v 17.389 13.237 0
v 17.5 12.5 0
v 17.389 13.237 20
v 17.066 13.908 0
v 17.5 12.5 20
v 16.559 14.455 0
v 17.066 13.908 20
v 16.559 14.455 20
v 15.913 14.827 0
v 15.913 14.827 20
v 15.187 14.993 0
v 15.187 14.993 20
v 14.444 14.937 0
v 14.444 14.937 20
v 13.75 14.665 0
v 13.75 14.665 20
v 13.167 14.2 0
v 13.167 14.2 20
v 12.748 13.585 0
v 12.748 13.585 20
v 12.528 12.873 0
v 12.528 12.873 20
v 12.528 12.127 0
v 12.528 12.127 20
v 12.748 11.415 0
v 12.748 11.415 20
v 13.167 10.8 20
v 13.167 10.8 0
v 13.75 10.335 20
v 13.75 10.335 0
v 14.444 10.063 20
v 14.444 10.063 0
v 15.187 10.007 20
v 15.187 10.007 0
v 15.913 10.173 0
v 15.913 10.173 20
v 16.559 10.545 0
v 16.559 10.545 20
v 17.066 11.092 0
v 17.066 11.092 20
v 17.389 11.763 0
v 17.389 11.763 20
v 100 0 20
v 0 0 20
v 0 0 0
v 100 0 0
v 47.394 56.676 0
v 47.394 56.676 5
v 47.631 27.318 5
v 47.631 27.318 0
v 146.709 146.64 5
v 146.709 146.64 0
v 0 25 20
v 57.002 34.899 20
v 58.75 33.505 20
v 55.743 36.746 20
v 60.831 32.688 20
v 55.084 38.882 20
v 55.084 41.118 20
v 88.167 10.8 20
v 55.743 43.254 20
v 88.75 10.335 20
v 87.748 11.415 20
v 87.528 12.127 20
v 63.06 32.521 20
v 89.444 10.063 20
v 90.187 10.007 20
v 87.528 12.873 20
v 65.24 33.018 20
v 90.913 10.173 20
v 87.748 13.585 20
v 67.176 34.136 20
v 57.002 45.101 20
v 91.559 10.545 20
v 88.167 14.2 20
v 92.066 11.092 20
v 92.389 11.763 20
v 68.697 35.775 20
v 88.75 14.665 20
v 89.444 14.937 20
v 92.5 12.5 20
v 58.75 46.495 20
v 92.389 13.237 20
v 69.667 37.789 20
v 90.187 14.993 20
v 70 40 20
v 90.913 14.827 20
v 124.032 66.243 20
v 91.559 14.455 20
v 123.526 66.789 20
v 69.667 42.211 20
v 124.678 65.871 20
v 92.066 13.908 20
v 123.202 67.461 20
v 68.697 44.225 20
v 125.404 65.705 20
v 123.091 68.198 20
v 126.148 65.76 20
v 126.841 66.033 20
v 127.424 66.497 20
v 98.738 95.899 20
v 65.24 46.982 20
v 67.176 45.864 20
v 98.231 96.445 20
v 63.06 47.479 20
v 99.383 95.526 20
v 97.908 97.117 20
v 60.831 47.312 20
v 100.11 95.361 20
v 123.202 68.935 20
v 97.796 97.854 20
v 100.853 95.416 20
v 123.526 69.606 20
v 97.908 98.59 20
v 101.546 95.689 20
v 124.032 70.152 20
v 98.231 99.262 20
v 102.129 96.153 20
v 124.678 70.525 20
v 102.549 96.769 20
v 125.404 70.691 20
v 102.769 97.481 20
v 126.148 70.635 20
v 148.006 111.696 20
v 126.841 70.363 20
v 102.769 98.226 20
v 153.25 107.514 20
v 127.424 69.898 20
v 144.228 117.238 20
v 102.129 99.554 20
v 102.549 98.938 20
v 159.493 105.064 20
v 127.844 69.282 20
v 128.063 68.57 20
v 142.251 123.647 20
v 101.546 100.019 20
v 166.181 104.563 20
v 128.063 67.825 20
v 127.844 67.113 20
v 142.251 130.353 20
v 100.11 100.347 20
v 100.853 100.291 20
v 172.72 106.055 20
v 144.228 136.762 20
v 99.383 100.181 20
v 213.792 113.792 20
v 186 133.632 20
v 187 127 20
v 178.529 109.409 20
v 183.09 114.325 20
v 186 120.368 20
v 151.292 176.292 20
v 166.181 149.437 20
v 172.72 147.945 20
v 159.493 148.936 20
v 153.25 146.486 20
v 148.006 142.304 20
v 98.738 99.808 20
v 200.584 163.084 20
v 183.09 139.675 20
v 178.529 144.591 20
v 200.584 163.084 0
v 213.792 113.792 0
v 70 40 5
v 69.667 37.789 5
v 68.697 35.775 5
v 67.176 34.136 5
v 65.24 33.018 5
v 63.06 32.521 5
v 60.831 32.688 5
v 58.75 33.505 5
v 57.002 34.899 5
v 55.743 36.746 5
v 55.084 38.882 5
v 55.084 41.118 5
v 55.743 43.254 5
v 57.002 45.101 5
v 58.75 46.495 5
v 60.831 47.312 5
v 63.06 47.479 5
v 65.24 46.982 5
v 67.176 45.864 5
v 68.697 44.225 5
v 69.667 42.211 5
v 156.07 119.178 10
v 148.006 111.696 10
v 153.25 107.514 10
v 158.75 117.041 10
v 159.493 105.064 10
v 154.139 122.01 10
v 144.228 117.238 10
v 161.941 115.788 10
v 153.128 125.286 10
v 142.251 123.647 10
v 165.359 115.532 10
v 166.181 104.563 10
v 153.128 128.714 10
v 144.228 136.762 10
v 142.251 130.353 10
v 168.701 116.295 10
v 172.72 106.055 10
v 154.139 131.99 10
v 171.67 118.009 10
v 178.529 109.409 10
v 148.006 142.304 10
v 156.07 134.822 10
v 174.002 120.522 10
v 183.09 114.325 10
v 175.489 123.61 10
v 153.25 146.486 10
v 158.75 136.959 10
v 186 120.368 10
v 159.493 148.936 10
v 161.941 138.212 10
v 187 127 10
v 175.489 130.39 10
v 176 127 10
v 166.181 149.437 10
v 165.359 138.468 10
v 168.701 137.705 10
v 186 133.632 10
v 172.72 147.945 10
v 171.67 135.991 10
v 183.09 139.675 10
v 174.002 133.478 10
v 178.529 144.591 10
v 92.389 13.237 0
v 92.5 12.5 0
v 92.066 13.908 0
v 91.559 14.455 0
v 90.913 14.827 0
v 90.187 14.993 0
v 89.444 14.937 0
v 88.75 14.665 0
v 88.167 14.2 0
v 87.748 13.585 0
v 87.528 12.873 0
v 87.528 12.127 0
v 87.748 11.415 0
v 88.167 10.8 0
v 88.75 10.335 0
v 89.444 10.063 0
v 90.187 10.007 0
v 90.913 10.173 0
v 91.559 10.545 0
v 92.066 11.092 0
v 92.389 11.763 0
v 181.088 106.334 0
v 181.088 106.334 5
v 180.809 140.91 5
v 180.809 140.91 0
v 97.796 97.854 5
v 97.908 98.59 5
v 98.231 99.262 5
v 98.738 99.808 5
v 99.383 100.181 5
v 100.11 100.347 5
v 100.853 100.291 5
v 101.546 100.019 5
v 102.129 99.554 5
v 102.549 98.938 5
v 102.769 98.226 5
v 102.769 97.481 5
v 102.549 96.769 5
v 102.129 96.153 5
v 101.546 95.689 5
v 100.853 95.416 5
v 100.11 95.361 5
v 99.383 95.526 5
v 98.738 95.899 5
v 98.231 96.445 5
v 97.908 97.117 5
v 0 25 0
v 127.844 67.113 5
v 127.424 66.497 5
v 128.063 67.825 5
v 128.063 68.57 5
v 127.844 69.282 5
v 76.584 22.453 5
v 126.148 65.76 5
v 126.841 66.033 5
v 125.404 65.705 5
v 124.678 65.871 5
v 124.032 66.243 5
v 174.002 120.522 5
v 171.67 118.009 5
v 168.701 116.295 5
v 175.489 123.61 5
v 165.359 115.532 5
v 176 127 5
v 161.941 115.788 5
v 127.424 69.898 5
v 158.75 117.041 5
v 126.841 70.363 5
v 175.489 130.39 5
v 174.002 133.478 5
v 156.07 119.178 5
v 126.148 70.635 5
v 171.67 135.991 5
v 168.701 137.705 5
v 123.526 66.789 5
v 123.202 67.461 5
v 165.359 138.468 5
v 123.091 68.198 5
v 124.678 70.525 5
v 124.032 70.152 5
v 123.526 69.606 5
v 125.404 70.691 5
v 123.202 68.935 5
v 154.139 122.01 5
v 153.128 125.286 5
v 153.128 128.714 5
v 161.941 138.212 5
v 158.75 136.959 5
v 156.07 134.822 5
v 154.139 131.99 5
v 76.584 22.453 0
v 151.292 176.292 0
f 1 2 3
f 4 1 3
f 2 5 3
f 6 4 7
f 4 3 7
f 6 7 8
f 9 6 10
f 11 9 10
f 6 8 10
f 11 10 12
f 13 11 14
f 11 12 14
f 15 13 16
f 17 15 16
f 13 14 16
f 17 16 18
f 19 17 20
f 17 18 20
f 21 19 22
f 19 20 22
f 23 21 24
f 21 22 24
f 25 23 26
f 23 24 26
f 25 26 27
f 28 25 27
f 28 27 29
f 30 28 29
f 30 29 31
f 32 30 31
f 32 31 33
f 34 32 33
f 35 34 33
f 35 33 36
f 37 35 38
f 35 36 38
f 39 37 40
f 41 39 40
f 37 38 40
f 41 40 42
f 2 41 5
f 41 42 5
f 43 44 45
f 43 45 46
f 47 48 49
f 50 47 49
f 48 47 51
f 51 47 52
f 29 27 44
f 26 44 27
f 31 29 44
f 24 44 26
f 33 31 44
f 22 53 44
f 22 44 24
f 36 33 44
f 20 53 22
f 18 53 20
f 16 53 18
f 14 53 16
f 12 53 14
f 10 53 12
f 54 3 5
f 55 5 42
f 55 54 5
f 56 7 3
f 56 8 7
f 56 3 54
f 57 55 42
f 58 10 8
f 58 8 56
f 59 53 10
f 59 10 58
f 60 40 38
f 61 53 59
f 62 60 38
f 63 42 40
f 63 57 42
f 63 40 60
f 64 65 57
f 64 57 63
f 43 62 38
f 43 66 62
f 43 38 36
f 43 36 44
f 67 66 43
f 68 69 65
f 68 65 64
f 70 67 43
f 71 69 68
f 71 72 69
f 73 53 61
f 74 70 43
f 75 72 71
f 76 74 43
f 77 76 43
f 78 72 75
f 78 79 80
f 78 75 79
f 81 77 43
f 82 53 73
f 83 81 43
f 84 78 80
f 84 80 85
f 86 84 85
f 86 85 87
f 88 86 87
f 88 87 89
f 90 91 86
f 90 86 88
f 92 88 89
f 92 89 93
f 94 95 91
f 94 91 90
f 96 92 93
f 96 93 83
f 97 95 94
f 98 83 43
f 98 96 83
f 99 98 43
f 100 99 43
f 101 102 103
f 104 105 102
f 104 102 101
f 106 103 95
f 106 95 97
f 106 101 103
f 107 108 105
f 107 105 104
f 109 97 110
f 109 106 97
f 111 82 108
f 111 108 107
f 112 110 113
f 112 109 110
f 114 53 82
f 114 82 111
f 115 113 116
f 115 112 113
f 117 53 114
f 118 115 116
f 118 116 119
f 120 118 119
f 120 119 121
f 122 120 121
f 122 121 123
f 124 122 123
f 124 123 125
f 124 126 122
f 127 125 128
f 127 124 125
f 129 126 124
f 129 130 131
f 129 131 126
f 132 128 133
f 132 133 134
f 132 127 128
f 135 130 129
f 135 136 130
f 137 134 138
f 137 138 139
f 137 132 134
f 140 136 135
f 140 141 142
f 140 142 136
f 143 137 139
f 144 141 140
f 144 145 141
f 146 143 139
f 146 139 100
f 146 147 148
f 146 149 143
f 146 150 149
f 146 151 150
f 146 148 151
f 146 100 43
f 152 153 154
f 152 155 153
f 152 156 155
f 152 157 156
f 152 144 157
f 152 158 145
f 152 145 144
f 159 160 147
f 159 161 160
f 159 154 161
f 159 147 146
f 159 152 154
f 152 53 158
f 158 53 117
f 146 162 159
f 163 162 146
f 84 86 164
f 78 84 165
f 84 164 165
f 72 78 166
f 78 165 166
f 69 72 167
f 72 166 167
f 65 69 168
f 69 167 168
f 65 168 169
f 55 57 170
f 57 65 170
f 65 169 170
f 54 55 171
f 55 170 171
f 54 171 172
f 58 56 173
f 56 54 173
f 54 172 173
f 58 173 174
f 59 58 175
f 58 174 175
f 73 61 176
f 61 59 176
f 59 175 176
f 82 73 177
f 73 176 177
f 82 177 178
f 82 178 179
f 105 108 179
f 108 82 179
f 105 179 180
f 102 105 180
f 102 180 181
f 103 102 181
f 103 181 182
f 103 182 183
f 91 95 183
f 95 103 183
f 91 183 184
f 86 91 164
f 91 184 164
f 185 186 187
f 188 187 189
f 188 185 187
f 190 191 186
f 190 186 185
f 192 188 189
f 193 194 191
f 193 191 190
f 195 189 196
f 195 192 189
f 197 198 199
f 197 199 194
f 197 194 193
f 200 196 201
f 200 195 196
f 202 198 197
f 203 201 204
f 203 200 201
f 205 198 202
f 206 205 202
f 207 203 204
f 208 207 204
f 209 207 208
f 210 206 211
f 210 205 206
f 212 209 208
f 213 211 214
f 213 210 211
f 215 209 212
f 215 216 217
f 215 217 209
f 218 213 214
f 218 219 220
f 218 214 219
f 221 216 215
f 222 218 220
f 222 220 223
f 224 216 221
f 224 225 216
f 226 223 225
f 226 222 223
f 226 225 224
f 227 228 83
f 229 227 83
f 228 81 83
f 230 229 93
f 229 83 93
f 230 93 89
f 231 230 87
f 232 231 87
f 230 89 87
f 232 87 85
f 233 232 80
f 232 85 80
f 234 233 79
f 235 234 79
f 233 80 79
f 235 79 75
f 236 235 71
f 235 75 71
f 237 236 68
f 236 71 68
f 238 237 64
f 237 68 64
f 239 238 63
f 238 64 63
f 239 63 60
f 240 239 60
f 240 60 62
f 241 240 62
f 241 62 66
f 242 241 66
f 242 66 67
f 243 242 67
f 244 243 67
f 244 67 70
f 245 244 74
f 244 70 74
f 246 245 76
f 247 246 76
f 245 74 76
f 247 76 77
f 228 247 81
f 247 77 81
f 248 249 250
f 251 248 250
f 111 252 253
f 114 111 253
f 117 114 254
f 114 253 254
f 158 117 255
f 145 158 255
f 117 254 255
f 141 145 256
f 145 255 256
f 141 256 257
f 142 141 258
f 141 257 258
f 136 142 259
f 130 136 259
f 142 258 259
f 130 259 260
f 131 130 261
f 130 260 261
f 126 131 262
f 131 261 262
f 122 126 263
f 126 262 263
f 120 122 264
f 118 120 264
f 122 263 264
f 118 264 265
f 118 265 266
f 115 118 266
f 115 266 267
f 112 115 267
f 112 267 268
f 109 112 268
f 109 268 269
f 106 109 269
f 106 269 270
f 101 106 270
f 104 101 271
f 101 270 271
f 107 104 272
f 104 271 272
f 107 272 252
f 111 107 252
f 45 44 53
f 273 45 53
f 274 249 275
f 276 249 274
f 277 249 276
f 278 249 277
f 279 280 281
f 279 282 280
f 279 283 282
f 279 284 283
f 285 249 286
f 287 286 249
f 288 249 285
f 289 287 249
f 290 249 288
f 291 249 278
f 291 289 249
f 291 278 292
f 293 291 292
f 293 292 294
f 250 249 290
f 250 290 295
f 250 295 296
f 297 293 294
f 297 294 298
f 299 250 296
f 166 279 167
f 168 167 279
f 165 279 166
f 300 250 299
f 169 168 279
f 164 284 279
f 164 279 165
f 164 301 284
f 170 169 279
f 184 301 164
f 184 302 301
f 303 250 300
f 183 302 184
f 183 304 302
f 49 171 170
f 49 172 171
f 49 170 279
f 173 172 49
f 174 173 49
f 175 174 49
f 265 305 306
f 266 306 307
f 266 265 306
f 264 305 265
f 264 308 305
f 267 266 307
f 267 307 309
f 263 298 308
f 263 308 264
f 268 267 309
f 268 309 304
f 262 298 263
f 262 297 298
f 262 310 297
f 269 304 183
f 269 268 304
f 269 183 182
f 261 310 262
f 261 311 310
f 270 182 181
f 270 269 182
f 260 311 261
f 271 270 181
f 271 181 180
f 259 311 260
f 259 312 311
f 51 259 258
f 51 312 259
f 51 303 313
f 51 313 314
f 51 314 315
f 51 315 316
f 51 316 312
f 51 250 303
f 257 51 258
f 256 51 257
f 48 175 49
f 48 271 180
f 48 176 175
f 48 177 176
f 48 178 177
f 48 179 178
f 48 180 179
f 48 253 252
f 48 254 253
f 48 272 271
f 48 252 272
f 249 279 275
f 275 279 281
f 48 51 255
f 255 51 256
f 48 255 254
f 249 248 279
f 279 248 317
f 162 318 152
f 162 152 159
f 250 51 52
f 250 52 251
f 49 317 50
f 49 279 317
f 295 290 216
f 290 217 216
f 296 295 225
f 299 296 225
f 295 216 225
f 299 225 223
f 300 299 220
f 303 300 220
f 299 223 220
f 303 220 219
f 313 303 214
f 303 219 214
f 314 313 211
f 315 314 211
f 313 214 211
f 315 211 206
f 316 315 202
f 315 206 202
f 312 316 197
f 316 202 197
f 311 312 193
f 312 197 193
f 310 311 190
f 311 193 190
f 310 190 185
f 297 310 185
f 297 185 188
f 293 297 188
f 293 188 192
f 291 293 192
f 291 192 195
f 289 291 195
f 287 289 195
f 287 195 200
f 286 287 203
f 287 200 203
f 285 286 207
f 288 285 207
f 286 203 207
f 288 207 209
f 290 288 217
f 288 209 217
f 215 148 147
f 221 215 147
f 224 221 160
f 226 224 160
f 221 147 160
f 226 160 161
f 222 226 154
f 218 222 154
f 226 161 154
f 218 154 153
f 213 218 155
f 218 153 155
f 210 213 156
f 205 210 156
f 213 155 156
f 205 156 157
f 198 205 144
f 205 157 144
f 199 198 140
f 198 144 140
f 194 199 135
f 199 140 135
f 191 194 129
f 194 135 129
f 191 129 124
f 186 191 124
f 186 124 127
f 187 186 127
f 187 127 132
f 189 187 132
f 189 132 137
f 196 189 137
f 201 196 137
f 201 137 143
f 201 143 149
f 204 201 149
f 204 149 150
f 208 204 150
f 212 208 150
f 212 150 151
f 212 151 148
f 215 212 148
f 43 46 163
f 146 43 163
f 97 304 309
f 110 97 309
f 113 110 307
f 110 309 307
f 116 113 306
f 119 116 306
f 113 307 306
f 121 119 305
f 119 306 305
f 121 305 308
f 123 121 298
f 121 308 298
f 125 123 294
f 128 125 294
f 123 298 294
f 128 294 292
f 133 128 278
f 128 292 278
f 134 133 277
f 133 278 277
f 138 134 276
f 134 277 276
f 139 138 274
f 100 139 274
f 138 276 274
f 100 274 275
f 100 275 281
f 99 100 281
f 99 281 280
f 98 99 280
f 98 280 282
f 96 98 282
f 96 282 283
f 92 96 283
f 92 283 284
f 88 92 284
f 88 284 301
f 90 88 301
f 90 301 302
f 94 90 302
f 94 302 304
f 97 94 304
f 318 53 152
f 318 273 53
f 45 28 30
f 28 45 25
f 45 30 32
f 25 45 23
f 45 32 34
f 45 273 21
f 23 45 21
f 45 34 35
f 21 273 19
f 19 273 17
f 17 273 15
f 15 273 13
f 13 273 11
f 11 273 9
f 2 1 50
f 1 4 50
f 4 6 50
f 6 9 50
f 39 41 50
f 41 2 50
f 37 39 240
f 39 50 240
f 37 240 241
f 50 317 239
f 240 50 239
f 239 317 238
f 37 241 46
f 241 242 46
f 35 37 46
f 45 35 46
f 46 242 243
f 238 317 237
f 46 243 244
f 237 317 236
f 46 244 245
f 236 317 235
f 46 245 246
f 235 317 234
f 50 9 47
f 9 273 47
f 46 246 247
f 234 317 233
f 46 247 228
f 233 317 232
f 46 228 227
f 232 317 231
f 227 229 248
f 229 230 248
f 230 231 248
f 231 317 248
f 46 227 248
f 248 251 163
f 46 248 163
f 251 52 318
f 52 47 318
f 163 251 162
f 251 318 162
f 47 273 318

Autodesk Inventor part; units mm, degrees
ref_plane "XZ Plane" through (0, 0, 0) normal (0, 1, 0) x (-1, 0, 0)
ref_plane "XY Plane" through (0, 0, 0) normal (0, 0, 1) x (1, 0, 0)
sketch "Sketch1" plane through (0, 0, 0) normal (0, 0, 1) x (1, 0, 0)
  line L0 (0, 0) -> (100, 0)
  line L1 (100, 0) -> (100, 25)
  line L2 (100, 25) -> (0, 25)
  line L3 (0, 25) -> (0, 0)
  line L4 (0, 25) -> (115.2078, 140.2078)
  line L5 (100, 0) -> (177.7078, 77.7078)
  line L6 (151.2922, 176.2922) -> (200.5844, 163.0844)
  line L7 (200.5844, 163.0844) -> (213.7922, 113.7922)
  line L8 (213.7922, 113.7922) -> (177.7078, 77.7078)
  line L9 (177.7078, 77.7078) -> (128.4156, 90.9156)
  line L10 (128.4156, 90.9156) -> (115.2078, 140.2078)
  line L11 (115.2078, 140.2078) -> (151.2922, 176.2922)
  circle A0 centre (164.5, 127) radius 4
  dimension "d0" = 100
  dimension "d1" = 25
  dimension "d6" = 8
  dimension "d8" = 45
  dimension "d15" = 127
extrude "Extrusion1" add sketch "Sketch1" along normal blind 20
sketch "Sketch2" plane through (0, 0, 20) normal (0, 0, 1) x (1, 0, 0)
  line L0 (0, 25) -> (0, 0) projected
  line L1 (0, 0) -> (100, 0) projected
  line L2 (0, 25) -> (100, 25)
  line L3 (100, 25) -> (100, 0)
  line L4 (100, 0) -> (0, 0)
  line L5 (0, 0) -> (0, 25)
  line L6 (100, 25) -> (125, 25)
  line L7 (100, 0) -> (213.7922, 113.7922) projected
  line L8 (100, 0) -> (125, 25)
extrude "Extrusion2" add sketch "Sketch2" along normal blind 250
sketch "Sketch4" plane through (0, 0, 270) normal (0, 0, 1) x (1, 0, 0)
  line L0 (0, 25) -> (125, 25) projected
  line L1 (125, 25) -> (213.7922, 113.7922) projected
  line L2 (213.7922, 113.7922) -> (200.5844, 163.0844) projected
  line L3 (200.5844, 163.0844) -> (151.2922, 176.2922) projected
  line L4 (151.2922, 176.2922) -> (0, 25) projected
  circle A0 centre (164.5, 127) radius 4 projected
  line L5 (100, 0) -> (125, 25) projected
  line L6 (125, 25) -> (0, 25) projected
  line L7 (0, 25) -> (0, 0) projected
  line L8 (0, 0) -> (100, 0) projected
extrude "Extrusion3" add sketch "Sketch4" along normal blind 20
sketch "Sketch5" plane through (0, 0, 0) normal (0, -1, 0) x (1, 0, 0)
  line L0 (0, 0) -> (100, 0) projected
  line L1 (100, 0) -> (100, 290) projected
  line L2 (0, 290) -> (100, 290) projected
  line L3 (0, 0) -> (0, 290) projected
  line L4 (0, 0) -> (-125.5737, 72.5)
  line L5 (-125.5737, 72.5) -> (-125.5737, 217.5)
  line L6 (-125.5737, 217.5) -> (0, 290)
  line L7 (0, 290) -> (125.5737, 217.5)
  line L8 (125.5737, 217.5) -> (125.5737, 72.5)
  line L9 (125.5737, 72.5) -> (0, 0)
  point P0 (0, 145)
extrude "Extrusion4" add sketch "Sketch5" against normal blind 25 contours L4 L5 L6 L3
sketch "Sketch6" plane through (0, 25, 20) normal (0, 1, 0) x (1, 0, 0)
  line L0 (100, 20) -> (100, -270) projected
  circle A0 centre (-24.528, -125) radius 3
  circle A1 centre (-31.528, -125) radius 1.5
  circle A2 centre (-21.028, -131.0622) radius 1.5
  circle A3 centre (-21.028, -118.9378) radius 1.5
  point P0 (0, 20)
  point P1 (100, -125)
  dimension "d18" = 6
  dimension "d19" = 124.528
  dimension "d20" = 3
  dimension "d21" = 7
  dimension "d24" = 360
extrude "Extrusion5" cut sketch "Sketch6" against normal through all
sketch "Sketch7" plane through (100, 0, 0) normal (0, -1, 0) x (1, 0, 0)
  circle A0 centre (-124.528, 145) radius 3 projected
  circle A1 centre (-124.528, 145) radius 12
  point P0 (-100, 0)
  dimension "d28" = 24
extrude "Extrusion6" cut sketch "Sketch7" against normal blind 5
sketch "Sketch8" plane through (0, 0, 270) normal (0, 0, -1) x (-1, 0, 0)
  circle A0 centre (-164.5, 127) radius 4 projected
  circle A1 centre (-164.5, 127) radius 12.5
  point P0 (0, 0)
  dimension "d31" = 25
extrude "Extrusion7" cut sketch "Sketch8" against normal blind 7
sketch "Sketch10" plane through (164.5, 127, 277) normal (0, 0, -1) x (-1, 0, 0)
  circle A0 centre (7, 0) radius 2
  circle A1 centre (0, 0) radius 4 projected
  circle A2 centre (-3.5, 6.0622) radius 2
  circle A3 centre (-3.5, -6.0622) radius 2
  point P0 (164.5, -127)
  dimension "d34" = 4
  dimension "d37" = 360
  dimension "d39" = 7
extrude "Extrusion8" cut sketch "Sketch10" against normal through all
sketch "Sketch11" plane through (0, 0, 290) normal (0, 0, 1) x (1, 0, 0)
  circle A0 centre (168, 133.0622) radius 2 projected
  circle A1 centre (164.5, 127) radius 4 projected
  circle A2 centre (168, 133.0622) radius 4
  circle A3 centre (157.5, 127) radius 4
  circle A4 centre (168, 120.9378) radius 4
  point P0 (0, 0)
  dimension "d42" = 8
  dimension "d45" = 360
extrude "Extrusion9" cut sketch "Sketch11" against normal blind 3 contours A0 | A1 A4 A3 A2 | A2 A1 | A1 A2 | A4 A1 | A1 A4 | A3 A1 | A1 A3
ref_plane "Work Plane1" through (164.5, 127, 270) normal (1, 0, 0) x (0, 0, 1)
sketch "Sketch12" plane through (164.5, 127, 270) normal (1, 0, 0) x (0, 0, 1)
  line L0 (17, -1.9365) -> (17, 1.9365) projected
  line L1 (17, 1.9365) -> (20, 1.9365) projected
  line L2 (20, 3.9993) -> (20, 1.9365) projected
  line L3 (20, 3.9993) -> (17, 3.9993) projected
  line L4 (17, 3.9993) -> (17, 2.0628) projected
  line L5 (17, 2.0628) -> (20, 2.0628) projected
  line L6 (20, -2.0628) -> (20, 2.0628) projected
  line L7 (20, -2.0628) -> (17, -2.0628) projected
  line L8 (17, -2.0628) -> (17, -3.9993) projected
  line L9 (17, -3.9993) -> (20, -3.9993) projected
  line L10 (20, -1.9365) -> (20, -3.9993) projected
  line L11 (20, -1.9365) -> (17, -1.9365) projected
  line L12 (7, 4) -> (7, -4) projected
  line L13 (7, -12.5) -> (7, 12.5) projected
  line L14 (0, -12.5) -> (0, 12.5) projected
  circle A0 centre (3.5, 0) radius 2
  line L15 (0, -12.5) -> (7, -12.5) projected
  point P0 (-270, 127)
  point P1 (7, 0)
  point P2 (3.5, -12.5)
  dimension "d50" = 4
extrude "Extrusion10" cut sketch "Sketch12" along normal through all contours A0
sketch "Sketch13" plane through (0, 0, 20) normal (0, 0, 1) x (1, 0, 0)
  line L0 (100, 0) -> (213.7922, 113.7922) projected
  line L1 (213.7922, 113.7922) -> (200.5844, 163.0844) projected
  line L2 (200.5844, 163.0844) -> (151.2922, 176.2922) projected
  line L3 (151.2922, 176.2922) -> (0, 25) projected
  line L4 (0, 25) -> (0, 0) projected
  line L5 (0, 0) -> (100, 0) projected
  arc A0 (161, 128.9365) -> (161, 125.0635) centre (157.5, 127) ccw projected
  arc A1 (164.5729, 130.9993) -> (161, 128.9365) centre (164.5, 127) ccw projected
  arc A2 (167.9271, 129.0628) -> (164.5729, 130.9993) centre (168, 133.0622) ccw projected
  arc A3 (167.9271, 124.9372) -> (167.9271, 129.0628) centre (164.5, 127) ccw projected
  arc A4 (164.5729, 123.0007) -> (167.9271, 124.9372) centre (168, 120.9378) ccw projected
  arc A5 (161, 125.0635) -> (164.5729, 123.0007) centre (164.5, 127) ccw projected
  line L6 (-125.5737, 25) -> (0, 25) projected
  line L7 (0, 0) -> (-125.5737, 0) projected
  line L8 (0, 25) -> (0, 0) projected
  line L9 (-125.5737, 25) -> (0, 25) projected
  line L10 (-125.5737, 0) -> (-125.5737, 25) projected
extrude "Extrusion11" cut sketch "Sketch13" along normal through all contours L5 L4 L3 L2 L1 L0 | L7 L10 L6 L4 | A1 A2 A3 A4 A5 A0
sketch "Sketch14" plane through (0, 0, 20) normal (0, 0, 1) x (1, 0, 0)
  line L0 (-34.641, 0) -> (0, 0) projected
  line L1 (151.2922, 176.2922) -> (0, 25) projected
  line L2 (0, 0) -> (0, 25)
  line L3 (-34.641, 0) -> (-34.641, 25) projected
  line L4 (0, 25) -> (-34.641, 25)
  line L5 (-34.641, 25) -> (-34.641, 0)
  line L6 (-34.641, 0) -> (0, 0)
extrude "Extrusion12" cut sketch "Sketch14" against normal through all
sketch "Sketch15" plane through (0, 0, 20) normal (0, 0, 1) x (1, 0, 0)
  line L0 (15, 12.5) -> (90, 12.5) construction
  line L1 (0, 0) -> (100, 0) projected
  circle A0 centre (15, 12.5) radius 2.5
  circle A1 centre (90, 12.5) radius 2.5
  dimension "d57" = 75
  dimension "d58" = 12.5
  dimension "d59" = 10
  dimension "d60" = 5
  dimension "d61" = 5
extrude "Extrusion13" cut sketch "Sketch15" against normal through all
sketch "Sketch16" plane through (0, 0, 20) normal (0, 0, 1) x (1, 0, 0)
  circle A0 centre (164.5, 127) radius 4 projected
  circle A1 centre (164.5, 127) radius 11.5
  point P0 (0, 0)
  dimension "d64" = 23
extrude "Extrusion14" cut sketch "Sketch16" against normal through all
sketch "Sketch17" plane through (0, 0, 20) normal (0, 0, 1) x (1, 0, 0)
  circle A0 centre (164.5, 127) radius 11.5 projected
  circle A1 centre (164.5, 127) radius 22.5
  point P0 (0, 0)
  dimension "d67" = 45
extrude "Extrusion15" cut sketch "Sketch17" against normal blind 10
sketch "Sketch18" plane through (0, 0, 20) normal (0, 0, 1) x (1, 0, 0)
  circle A0 centre (62.5, 40) radius 7.5
  line L0 (0, 25) -> (0, 0) projected
  line L1 (0, 25) -> (125, 25)
  line L2 (100, 0) -> (213.7922, 113.7922) projected
  point P0 (62.5, 25)
  dimension "d70" = 15
  dimension "d71" = 15
extrude "Extrusion16" cut sketch "Sketch18" against normal through all
sketch "Sketch19" plane through (0, 0, 0) normal (0, 0, -1) x (-1, 0, 0)
  line L0 (-156.7794, 135.523) -> (-57.4648, 45.5585)
  circle A0 centre (-62.5, 40) radius 7.5 projected
  line L1 (-67.1947, 34.1511) -> (-171.6985, 118.0316)
  circle A1 centre (-164.5, 127) radius 11.5 projected
  circle A2 centre (-62.5, 40) radius 7.5 projected
  arc A3 (-156.7794, 135.523) -> (-171.6985, 118.0316) centre (-164.5, 127) ccw
  arc A4 (-67.1947, 34.1511) -> (-57.4648, 45.5585) centre (-62.5, 40) ccw
  point P0 (0, 0)
extrude "Extrusion17" cut sketch "Sketch19" against normal blind 4
sketch "Sketch20" plane through (0, 0, 0) normal (0, 0, -1) x (-1, 0, 0)
  arc A0 (-156.7794, 135.523) -> (-171.6985, 118.0316) centre (-164.5, 127) ccw projected
  line L0 (-156.7794, 135.523) -> (-57.4648, 45.5585) projected
  line L1 (-67.1947, 34.1511) -> (-171.6985, 118.0316) projected
  arc A1 (-67.1947, 34.1511) -> (-57.4648, 45.5585) centre (-62.5, 40) ccw projected
  line L2 (-47.3944, 56.6755) -> (-146.709, 146.64)
  arc A2 (-146.709, 146.64) -> (-181.0879, 106.3338) centre (-164.5, 127) ccw
  line L3 (-181.0879, 106.3338) -> (-76.584, 22.4532)
  arc A3 (-76.584, 22.4532) -> (-47.3944, 56.6755) centre (-62.5, 40) ccw
  point P0 (0, 0)
  dimension "d76" = 15
extrude "Extrusion18" cut sketch "Sketch20" against normal blind 5 contours L0 A1 L1 A0 | A3 L3 A2 L2
sketch "Sketch21" plane through (0, 0, 5) normal (0, 0, -1) x (-1, 0, 0)
  circle A0 centre (-62.5, 40) radius 7.5 projected
  circle A1 centre (-164.5, 127) radius 11.5 projected
  line L0 (-146.709, 146.64) -> (-47.3944, 56.6755) projected
  arc A2 (-146.709, 146.64) -> (-181.0879, 106.3338) centre (-164.5, 127) ccw projected
  line L1 (-76.584, 22.4532) -> (-181.0879, 106.3338) projected
  arc A3 (-76.584, 22.4532) -> (-47.3944, 56.6755) centre (-62.5, 40) ccw projected
  line L2 (-76.584, 22.4532) -> (-181.0879, 106.3338) projected
  line L3 (-128.8359, 64.3935) -> (-97.0517, 101.6578) construction
  line L4 (-146.709, 146.64) -> (-47.3944, 56.6755) projected
  circle A4 centre (-125.5912, 68.1977) radius 2.5
  circle A5 centre (-100.2965, 97.8536) radius 2.5
  point P0 (0, 0)
  dimension "d79" = 5
  dimension "d80" = 5
  dimension "d81" = 5
  dimension "d82" = 5
extrude "Extrusion19" cut sketch "Sketch21" against normal through all contours A4 | A5
sketch "Sketch22" plane through (0, 0, 5) normal (0, 0, -1) x (-1, 0, 0)
  arc A0 (-146.709, 146.64) -> (-181.0879, 106.3338) centre (-164.5, 127) ccw projected
  arc A1 (-76.584, 22.4532) -> (-47.3944, 56.6755) centre (-62.5, 40) ccw projected
  line L0 (-180.8089, 140.9105) -> (-47.6313, 27.3179)
  line L1 (-76.584, 22.4532) -> (-181.0879, 106.3338) projected
  line L2 (-181.0879, 106.3338) -> (-180.8089, 140.9105)
  line L3 (-146.709, 146.64) -> (-180.8089, 140.9105)
  line L4 (-76.584, 22.4532) -> (-47.6313, 27.3179)
  line L5 (-47.3944, 56.6755) -> (-47.6313, 27.3179)
  point P0 (0, 0)
  dimension "d85" = 100
  dimension "d86" = 100
extrude "Extrusion20" add sketch "Sketch22" along normal blind 5 contours L3 L2 A0 | L4 L5 A1
properties part number "HA02" material "ABS Plastic"
